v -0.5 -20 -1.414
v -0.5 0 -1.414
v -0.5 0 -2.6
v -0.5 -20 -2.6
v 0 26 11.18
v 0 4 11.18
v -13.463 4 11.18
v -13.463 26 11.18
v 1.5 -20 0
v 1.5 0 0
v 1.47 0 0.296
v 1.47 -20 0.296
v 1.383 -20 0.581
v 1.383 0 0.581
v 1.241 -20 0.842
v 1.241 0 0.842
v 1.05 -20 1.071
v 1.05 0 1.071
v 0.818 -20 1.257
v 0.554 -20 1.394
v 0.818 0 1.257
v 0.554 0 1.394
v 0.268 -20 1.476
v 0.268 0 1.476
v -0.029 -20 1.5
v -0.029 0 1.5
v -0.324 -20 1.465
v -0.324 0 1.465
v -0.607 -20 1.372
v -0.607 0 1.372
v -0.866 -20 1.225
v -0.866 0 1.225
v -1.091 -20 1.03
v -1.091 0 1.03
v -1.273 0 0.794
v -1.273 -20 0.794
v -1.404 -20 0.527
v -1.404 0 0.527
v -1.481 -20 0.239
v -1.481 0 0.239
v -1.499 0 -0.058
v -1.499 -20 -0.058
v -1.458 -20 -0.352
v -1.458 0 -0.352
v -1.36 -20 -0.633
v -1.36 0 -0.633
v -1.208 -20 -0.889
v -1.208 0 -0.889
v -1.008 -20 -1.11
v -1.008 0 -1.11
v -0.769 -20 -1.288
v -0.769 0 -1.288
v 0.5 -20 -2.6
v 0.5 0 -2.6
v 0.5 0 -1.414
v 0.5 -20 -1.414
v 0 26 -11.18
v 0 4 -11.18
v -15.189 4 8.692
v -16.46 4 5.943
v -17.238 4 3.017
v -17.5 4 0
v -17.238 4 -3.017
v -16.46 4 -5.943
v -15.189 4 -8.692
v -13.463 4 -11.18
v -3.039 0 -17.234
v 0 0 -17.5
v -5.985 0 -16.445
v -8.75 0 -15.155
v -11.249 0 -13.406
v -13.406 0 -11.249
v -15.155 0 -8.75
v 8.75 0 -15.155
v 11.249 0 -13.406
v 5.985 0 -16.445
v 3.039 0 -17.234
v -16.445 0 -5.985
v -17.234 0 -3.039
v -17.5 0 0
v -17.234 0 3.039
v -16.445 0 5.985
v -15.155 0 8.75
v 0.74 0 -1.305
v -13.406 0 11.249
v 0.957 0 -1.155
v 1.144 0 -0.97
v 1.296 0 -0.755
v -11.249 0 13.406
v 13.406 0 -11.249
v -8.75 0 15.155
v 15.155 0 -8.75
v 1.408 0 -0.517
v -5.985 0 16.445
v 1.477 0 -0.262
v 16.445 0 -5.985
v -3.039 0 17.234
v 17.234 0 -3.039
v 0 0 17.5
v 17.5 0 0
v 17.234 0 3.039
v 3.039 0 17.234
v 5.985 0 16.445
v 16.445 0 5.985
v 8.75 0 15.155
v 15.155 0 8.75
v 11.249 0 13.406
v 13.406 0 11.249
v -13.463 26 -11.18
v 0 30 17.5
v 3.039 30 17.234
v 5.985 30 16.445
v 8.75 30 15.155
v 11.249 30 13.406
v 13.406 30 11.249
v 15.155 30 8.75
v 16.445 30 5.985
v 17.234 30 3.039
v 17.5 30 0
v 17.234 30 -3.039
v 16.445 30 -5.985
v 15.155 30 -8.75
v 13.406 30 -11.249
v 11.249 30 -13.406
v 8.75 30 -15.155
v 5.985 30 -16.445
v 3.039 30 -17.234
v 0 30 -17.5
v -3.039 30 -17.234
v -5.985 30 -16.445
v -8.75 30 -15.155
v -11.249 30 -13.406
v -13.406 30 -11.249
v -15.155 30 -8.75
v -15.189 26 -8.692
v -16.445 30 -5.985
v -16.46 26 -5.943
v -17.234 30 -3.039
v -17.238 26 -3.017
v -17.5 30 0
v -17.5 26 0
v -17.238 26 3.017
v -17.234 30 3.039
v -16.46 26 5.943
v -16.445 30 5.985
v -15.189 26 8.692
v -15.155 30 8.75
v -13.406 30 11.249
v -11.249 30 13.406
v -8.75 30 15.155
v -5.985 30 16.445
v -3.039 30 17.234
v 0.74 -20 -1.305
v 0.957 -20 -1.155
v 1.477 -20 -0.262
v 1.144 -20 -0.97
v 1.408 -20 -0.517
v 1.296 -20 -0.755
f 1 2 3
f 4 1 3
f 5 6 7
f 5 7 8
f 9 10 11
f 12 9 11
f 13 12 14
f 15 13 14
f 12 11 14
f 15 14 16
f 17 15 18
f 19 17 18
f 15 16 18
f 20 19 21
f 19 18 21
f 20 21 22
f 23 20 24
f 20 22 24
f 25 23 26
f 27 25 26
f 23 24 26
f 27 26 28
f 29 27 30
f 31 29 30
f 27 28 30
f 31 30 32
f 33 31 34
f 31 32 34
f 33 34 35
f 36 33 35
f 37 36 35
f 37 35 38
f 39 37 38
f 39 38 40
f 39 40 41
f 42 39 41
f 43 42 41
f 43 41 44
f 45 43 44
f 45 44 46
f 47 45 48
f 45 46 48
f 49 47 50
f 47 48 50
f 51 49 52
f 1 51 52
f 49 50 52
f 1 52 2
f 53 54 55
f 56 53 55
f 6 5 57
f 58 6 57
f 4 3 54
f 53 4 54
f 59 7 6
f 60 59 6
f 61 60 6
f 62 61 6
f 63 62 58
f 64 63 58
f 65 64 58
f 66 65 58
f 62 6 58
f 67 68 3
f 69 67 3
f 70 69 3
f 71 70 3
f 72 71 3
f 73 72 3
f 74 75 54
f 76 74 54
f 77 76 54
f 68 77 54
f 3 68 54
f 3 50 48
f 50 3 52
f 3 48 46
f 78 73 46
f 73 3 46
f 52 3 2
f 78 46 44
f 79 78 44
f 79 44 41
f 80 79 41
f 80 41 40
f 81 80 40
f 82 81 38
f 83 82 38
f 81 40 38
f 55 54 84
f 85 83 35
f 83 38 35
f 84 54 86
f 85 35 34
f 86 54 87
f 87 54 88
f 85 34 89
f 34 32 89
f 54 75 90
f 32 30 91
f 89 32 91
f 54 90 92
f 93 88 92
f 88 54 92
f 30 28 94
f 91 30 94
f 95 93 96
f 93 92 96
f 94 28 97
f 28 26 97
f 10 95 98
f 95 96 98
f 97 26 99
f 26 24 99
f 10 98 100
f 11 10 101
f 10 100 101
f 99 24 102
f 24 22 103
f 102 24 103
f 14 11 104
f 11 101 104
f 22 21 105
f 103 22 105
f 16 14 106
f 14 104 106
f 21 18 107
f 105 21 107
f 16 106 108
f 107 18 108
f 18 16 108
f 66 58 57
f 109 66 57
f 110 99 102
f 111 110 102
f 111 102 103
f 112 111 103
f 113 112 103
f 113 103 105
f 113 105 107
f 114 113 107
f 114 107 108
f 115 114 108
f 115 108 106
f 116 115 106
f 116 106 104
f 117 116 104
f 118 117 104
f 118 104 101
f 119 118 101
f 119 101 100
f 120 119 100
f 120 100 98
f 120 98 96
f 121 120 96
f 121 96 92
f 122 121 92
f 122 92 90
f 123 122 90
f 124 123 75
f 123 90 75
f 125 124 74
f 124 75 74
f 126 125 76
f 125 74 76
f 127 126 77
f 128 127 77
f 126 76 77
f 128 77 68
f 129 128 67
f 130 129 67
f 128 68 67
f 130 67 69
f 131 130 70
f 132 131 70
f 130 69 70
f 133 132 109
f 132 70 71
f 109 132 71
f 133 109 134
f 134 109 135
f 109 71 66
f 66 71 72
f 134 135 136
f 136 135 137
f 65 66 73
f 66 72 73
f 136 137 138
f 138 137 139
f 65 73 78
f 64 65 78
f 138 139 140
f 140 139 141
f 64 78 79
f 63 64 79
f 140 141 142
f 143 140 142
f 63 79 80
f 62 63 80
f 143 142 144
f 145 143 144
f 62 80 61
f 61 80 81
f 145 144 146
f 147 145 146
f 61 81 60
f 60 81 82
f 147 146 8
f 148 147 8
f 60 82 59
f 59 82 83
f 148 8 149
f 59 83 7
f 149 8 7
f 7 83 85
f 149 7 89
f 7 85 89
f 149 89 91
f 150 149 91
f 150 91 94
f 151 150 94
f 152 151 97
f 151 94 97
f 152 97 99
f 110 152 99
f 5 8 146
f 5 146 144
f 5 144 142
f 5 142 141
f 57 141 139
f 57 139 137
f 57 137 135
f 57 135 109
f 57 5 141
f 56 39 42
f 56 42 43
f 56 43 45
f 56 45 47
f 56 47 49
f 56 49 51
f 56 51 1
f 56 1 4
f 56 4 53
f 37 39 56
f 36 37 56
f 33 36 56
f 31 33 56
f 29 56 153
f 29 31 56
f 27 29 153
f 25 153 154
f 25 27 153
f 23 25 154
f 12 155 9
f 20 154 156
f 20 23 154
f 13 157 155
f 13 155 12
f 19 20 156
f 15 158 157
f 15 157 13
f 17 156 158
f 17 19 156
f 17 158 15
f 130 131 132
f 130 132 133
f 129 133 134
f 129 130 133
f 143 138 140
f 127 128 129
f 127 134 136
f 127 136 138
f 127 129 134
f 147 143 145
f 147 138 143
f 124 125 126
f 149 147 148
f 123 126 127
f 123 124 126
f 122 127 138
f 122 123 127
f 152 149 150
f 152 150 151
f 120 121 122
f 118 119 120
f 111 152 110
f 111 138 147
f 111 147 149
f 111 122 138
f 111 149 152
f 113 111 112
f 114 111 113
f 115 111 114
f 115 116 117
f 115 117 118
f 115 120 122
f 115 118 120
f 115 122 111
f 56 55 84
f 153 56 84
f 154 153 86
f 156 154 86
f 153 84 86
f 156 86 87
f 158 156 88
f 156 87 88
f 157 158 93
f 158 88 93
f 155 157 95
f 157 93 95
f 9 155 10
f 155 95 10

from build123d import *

# Parameters (mm, degrees)
SKETCH1_R           = 17.5
BOSS_EXTRUDE1_DEPTH = 30
SKETCH2_W           = 22.36
SKETCH2_H           = 22
CUT_EXTRUDE1_DEPTH  = 30
BOSS_EXTRUDE2_DEPTH = 20


with BuildPart() as part:
    # Sketch1 → Boss-Extrude1 (new body)
    with BuildSketch(Plane(origin=(0, 0, 0), x_dir=(1, 0, 0), z_dir=(0, 1, 0))):
        Circle(SKETCH1_R)
    extrude(amount=BOSS_EXTRUDE1_DEPTH)

    # Sketch2 → Cut-Extrude1 (cut)
    with BuildSketch(Plane(origin=(0, 0, 0), x_dir=(0, 0, -1), z_dir=(1, 0, 0))):
        with Locations((0, 15)):
            Rectangle(SKETCH2_W, SKETCH2_H)
    extrude(amount=-CUT_EXTRUDE1_DEPTH, mode=Mode.SUBTRACT)

    # Sketch3 → Boss-Extrude2 (add)
    with BuildSketch(Plane.XZ):
        with BuildLine():
            Line((-0.5, -1.414213562), (-0.5, -2.6))
            Line((-0.5, -2.6), (0.5, -2.6))
            Line((0.5, -2.6), (0.5, -1.414213562))
            ThreePointArc((0.5, -1.414213562), (0, 1.5), (-0.5, -1.414213562))
        make_face()
    extrude(amount=BOSS_EXTRUDE2_DEPTH)


solid = part.part
